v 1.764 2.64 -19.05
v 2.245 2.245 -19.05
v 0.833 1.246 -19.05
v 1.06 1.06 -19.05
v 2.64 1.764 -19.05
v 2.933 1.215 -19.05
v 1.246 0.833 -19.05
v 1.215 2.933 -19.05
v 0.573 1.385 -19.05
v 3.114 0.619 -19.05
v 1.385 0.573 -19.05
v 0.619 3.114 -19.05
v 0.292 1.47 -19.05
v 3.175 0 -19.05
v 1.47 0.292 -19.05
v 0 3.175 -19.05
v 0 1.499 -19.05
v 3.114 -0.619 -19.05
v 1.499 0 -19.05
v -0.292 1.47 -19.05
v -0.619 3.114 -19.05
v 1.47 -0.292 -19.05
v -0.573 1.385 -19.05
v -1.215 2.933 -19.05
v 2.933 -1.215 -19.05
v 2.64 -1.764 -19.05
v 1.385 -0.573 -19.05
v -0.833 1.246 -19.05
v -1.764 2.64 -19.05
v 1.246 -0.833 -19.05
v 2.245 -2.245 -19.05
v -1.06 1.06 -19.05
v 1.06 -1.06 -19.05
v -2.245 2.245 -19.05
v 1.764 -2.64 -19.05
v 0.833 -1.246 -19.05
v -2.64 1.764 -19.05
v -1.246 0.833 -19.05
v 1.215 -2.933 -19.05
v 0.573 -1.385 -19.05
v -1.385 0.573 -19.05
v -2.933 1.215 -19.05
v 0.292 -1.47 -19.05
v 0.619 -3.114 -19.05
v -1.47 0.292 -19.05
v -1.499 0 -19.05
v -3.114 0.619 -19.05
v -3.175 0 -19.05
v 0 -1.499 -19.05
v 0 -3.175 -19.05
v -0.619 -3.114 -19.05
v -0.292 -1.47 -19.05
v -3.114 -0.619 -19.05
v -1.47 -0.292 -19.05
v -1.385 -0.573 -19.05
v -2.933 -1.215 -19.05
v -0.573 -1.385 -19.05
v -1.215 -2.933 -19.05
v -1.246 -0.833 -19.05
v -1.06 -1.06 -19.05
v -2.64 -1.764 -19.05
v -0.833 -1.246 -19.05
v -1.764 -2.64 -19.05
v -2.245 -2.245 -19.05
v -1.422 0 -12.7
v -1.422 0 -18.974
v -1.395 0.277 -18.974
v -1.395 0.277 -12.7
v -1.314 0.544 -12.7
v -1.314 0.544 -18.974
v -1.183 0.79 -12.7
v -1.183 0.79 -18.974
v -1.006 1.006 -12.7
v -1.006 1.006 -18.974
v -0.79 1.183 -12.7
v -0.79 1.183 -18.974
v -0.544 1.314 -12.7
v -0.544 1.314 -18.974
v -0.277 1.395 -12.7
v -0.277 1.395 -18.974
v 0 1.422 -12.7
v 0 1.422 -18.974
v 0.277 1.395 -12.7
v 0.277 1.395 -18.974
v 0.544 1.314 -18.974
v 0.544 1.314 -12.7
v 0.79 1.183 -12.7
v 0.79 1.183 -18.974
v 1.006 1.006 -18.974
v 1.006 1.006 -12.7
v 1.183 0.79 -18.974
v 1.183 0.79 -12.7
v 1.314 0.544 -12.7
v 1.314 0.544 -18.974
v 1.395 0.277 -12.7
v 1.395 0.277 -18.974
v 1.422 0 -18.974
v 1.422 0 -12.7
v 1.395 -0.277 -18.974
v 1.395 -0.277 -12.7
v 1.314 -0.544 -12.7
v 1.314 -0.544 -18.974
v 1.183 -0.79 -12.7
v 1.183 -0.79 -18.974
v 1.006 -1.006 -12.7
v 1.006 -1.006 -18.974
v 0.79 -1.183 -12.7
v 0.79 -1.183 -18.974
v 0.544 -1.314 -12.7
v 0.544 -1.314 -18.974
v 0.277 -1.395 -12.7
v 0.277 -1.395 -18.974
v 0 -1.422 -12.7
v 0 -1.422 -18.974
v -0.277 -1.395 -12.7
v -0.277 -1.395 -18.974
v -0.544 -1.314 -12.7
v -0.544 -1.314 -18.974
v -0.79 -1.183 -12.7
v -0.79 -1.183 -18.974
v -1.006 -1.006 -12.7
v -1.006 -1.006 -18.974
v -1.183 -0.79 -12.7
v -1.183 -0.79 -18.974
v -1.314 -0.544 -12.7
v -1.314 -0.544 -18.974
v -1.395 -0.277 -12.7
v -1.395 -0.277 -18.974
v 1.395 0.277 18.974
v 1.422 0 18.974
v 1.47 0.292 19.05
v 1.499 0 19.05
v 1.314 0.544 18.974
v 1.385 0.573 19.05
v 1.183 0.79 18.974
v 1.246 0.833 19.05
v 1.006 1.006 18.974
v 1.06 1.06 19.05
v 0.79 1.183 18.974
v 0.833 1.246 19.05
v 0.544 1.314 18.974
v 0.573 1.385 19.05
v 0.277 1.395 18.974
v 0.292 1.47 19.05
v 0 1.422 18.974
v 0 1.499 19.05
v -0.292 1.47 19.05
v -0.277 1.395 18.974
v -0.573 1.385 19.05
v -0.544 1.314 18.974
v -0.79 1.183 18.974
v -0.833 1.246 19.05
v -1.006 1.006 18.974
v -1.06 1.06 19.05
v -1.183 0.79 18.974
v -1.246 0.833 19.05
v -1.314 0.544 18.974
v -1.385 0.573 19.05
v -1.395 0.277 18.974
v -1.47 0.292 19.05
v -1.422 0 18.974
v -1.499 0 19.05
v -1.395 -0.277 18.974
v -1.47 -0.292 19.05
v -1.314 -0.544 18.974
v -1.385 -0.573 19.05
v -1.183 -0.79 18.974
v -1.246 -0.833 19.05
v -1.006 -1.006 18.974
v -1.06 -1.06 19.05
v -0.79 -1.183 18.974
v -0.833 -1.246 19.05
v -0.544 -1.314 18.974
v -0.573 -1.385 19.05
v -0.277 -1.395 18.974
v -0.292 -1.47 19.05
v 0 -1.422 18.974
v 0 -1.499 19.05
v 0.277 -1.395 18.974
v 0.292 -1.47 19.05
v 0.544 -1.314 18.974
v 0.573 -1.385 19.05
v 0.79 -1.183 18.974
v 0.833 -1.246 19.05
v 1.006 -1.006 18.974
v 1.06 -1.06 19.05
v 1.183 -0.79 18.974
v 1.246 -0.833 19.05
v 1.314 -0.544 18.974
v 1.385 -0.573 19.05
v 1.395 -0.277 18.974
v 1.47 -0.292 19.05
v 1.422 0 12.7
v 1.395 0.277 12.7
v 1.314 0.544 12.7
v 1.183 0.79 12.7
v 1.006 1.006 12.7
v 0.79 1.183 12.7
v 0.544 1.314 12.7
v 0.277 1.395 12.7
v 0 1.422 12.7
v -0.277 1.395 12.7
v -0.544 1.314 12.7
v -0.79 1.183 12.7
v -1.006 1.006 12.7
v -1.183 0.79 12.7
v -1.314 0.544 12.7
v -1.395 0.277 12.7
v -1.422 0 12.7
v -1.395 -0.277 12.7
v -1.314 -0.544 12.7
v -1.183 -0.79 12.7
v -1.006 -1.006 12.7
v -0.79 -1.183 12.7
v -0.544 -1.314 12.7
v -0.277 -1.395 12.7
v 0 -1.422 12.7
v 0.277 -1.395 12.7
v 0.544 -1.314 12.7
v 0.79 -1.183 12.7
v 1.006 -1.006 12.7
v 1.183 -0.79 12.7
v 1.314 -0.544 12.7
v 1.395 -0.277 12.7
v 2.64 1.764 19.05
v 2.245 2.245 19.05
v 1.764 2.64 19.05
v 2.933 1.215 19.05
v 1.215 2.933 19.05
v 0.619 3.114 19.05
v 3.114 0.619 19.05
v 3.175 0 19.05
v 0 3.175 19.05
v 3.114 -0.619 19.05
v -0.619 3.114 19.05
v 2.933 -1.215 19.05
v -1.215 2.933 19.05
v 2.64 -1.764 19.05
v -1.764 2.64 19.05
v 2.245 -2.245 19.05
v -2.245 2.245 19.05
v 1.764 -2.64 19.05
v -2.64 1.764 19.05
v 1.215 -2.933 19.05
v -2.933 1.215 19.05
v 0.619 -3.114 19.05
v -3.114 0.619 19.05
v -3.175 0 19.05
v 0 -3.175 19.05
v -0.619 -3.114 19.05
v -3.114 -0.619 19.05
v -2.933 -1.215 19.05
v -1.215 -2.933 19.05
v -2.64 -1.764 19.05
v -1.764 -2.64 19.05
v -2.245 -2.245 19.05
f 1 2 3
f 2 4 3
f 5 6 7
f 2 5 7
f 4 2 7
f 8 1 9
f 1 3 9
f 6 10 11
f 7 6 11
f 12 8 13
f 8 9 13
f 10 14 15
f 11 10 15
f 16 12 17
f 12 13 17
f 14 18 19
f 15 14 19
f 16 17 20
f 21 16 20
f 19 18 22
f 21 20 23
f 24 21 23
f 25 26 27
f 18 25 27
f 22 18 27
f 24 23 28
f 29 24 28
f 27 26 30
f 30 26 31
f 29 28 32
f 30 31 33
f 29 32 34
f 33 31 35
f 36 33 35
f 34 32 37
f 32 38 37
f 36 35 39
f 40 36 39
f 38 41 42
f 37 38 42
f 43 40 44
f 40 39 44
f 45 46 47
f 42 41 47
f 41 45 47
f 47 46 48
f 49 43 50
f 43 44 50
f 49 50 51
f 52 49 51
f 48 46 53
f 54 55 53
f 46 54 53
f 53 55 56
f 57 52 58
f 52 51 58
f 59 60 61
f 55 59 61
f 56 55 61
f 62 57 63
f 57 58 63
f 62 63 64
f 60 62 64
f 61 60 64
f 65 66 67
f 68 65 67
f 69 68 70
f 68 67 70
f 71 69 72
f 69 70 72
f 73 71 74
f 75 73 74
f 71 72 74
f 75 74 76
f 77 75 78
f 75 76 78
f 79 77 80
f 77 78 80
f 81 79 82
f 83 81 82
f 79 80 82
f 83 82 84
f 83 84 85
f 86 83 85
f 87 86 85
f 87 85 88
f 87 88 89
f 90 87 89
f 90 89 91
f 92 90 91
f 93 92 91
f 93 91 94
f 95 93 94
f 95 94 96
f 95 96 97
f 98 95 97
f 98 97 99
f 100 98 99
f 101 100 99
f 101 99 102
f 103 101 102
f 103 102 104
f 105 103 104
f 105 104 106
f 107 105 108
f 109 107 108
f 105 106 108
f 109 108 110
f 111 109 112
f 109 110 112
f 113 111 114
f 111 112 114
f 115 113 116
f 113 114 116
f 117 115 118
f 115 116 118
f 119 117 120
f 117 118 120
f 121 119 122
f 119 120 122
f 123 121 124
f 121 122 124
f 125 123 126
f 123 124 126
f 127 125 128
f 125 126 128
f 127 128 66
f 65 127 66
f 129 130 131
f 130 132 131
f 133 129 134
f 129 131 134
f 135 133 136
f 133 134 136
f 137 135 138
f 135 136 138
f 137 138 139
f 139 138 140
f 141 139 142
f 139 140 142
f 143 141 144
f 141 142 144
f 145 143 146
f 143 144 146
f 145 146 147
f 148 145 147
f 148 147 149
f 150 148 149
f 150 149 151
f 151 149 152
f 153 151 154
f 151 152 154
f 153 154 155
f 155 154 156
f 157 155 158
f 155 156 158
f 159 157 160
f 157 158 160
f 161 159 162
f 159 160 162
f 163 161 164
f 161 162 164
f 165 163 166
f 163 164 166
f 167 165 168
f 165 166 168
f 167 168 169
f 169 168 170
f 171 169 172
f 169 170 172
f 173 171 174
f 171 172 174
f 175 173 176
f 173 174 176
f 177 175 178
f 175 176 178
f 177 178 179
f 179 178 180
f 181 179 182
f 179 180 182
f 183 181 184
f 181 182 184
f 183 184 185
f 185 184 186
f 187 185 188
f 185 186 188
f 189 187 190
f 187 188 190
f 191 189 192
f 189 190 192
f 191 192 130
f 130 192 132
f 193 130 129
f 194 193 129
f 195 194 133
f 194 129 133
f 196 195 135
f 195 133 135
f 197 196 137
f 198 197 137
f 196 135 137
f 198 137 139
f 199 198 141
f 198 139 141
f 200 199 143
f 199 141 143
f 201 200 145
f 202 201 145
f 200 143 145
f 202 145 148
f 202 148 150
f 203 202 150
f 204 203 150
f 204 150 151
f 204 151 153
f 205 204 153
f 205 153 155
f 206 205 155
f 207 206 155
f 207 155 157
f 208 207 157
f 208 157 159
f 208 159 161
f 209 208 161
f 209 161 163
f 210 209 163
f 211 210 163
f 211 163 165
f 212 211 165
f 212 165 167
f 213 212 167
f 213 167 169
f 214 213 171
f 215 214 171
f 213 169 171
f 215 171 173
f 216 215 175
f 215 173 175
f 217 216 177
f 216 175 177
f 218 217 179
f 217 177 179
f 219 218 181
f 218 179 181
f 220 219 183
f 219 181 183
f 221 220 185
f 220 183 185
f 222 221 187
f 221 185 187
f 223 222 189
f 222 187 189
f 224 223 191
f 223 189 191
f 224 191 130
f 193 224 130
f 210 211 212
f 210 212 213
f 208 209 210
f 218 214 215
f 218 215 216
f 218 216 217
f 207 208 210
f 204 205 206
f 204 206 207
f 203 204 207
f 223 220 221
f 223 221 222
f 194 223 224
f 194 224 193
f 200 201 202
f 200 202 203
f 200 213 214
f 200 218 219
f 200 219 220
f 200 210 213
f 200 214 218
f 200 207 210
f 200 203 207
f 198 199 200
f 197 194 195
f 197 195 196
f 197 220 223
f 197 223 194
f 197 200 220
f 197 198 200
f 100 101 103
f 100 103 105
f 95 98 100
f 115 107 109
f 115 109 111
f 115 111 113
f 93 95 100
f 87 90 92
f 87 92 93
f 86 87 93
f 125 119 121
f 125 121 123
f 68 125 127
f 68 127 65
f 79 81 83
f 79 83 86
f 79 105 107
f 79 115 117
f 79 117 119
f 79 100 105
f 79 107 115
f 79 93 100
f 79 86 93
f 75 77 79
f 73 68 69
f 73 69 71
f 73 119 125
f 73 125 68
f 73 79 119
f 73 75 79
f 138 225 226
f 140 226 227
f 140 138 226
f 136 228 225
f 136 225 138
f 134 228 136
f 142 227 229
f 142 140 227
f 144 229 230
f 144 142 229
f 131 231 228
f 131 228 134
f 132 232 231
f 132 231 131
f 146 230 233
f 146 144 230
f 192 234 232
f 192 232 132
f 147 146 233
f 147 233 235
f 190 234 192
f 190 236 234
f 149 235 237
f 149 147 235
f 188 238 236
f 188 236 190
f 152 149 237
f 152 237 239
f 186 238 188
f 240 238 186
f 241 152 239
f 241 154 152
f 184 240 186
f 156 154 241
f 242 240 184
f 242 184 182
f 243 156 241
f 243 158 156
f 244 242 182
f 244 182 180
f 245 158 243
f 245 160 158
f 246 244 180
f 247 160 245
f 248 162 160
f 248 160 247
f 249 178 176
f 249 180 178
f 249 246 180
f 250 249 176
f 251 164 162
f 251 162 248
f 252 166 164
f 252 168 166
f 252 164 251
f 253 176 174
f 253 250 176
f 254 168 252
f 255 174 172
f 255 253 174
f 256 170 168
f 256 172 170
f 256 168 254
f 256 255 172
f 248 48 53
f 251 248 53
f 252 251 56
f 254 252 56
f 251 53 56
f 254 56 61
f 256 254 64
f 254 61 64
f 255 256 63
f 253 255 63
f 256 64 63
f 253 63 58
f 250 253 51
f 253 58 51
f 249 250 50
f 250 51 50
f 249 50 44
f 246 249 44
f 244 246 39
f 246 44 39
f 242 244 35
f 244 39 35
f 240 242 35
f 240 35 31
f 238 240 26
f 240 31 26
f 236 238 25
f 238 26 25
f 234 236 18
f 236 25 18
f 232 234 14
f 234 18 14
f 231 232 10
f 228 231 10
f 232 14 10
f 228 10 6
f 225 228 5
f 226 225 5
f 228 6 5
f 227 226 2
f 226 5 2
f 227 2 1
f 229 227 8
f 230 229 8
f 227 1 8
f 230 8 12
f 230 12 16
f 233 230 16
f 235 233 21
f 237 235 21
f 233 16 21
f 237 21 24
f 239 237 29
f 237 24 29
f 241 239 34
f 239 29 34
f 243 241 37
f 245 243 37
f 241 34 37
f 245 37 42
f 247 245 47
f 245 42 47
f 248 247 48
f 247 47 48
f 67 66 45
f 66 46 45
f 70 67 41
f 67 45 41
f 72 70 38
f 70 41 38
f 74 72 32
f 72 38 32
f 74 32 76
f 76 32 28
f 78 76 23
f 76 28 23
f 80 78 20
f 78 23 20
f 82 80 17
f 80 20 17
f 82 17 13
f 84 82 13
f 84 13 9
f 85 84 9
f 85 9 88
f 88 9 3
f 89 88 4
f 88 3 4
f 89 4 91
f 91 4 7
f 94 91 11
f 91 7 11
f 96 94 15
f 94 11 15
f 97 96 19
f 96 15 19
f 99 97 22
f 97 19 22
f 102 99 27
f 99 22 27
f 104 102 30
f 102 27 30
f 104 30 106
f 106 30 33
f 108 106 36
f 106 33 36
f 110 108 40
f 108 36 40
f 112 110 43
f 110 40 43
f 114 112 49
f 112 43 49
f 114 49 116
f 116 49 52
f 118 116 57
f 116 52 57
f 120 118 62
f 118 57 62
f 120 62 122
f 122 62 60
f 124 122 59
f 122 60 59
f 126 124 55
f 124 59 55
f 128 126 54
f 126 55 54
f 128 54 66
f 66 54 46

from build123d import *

# Parameters (mm, degrees)
BOSS_EXTRUDE1_START = 19.05
SKETCH13_R          = 1.4224
BOSS_EXTRUDE1_DEPTH = 6.35
CIRPATTERN1_COUNT   = 2
CIRPATTERN1_ANGLE   = 180
EXTRUDE1_DEPTH      = 19.05
EXTRUDE1_DEPTH_BACK = 19.05
SKETCH1_R           = 3.175


# Read off the part's stored shape, not the designer's step: Boss-Extrude2
with BuildPart() as part:
    # Sketch13 → Boss-Extrude1 (new body)
    with BuildSketch(Plane.XY.offset(BOSS_EXTRUDE1_START)):
        Circle(SKETCH13_R)
    extrude(amount=-BOSS_EXTRUDE1_DEPTH)

    # Boss-Extrude2 outline → Boss-Extrude2 (revolve)
    with BuildSketch(Plane.XZ):
        Polygon((1.4224, 19.05), (1.4224, 18.9738), (1.4986, 19.05), align=None)
    revolve(axis=Axis((0, 0, 0), (0, 0, 1)))


with BuildPart() as cirpattern1_1:
    # CirPattern1: pattern copy
    add(part.part.rotate(Axis((0, 3.175, 0), (0, -1, 0)), 1 * CIRPATTERN1_ANGLE / (CIRPATTERN1_COUNT - 1)))


with BuildPart() as body_3:
    # Sketch1 → Extrude1 (new, two sides: drawn at the far end of the back side and taken through both)
    with BuildSketch(Plane.XY.offset(-EXTRUDE1_DEPTH_BACK)):
        with Locations(Location((0, 0, 0), (0, 0, 180))):
            Circle(SKETCH1_R)
    extrude(amount=EXTRUDE1_DEPTH + EXTRUDE1_DEPTH_BACK)

    # Combine1: cut CirPattern1_1, part
    add(cirpattern1_1.part, mode=Mode.SUBTRACT)
    add(part.part, mode=Mode.SUBTRACT)


solid = body_3.part
